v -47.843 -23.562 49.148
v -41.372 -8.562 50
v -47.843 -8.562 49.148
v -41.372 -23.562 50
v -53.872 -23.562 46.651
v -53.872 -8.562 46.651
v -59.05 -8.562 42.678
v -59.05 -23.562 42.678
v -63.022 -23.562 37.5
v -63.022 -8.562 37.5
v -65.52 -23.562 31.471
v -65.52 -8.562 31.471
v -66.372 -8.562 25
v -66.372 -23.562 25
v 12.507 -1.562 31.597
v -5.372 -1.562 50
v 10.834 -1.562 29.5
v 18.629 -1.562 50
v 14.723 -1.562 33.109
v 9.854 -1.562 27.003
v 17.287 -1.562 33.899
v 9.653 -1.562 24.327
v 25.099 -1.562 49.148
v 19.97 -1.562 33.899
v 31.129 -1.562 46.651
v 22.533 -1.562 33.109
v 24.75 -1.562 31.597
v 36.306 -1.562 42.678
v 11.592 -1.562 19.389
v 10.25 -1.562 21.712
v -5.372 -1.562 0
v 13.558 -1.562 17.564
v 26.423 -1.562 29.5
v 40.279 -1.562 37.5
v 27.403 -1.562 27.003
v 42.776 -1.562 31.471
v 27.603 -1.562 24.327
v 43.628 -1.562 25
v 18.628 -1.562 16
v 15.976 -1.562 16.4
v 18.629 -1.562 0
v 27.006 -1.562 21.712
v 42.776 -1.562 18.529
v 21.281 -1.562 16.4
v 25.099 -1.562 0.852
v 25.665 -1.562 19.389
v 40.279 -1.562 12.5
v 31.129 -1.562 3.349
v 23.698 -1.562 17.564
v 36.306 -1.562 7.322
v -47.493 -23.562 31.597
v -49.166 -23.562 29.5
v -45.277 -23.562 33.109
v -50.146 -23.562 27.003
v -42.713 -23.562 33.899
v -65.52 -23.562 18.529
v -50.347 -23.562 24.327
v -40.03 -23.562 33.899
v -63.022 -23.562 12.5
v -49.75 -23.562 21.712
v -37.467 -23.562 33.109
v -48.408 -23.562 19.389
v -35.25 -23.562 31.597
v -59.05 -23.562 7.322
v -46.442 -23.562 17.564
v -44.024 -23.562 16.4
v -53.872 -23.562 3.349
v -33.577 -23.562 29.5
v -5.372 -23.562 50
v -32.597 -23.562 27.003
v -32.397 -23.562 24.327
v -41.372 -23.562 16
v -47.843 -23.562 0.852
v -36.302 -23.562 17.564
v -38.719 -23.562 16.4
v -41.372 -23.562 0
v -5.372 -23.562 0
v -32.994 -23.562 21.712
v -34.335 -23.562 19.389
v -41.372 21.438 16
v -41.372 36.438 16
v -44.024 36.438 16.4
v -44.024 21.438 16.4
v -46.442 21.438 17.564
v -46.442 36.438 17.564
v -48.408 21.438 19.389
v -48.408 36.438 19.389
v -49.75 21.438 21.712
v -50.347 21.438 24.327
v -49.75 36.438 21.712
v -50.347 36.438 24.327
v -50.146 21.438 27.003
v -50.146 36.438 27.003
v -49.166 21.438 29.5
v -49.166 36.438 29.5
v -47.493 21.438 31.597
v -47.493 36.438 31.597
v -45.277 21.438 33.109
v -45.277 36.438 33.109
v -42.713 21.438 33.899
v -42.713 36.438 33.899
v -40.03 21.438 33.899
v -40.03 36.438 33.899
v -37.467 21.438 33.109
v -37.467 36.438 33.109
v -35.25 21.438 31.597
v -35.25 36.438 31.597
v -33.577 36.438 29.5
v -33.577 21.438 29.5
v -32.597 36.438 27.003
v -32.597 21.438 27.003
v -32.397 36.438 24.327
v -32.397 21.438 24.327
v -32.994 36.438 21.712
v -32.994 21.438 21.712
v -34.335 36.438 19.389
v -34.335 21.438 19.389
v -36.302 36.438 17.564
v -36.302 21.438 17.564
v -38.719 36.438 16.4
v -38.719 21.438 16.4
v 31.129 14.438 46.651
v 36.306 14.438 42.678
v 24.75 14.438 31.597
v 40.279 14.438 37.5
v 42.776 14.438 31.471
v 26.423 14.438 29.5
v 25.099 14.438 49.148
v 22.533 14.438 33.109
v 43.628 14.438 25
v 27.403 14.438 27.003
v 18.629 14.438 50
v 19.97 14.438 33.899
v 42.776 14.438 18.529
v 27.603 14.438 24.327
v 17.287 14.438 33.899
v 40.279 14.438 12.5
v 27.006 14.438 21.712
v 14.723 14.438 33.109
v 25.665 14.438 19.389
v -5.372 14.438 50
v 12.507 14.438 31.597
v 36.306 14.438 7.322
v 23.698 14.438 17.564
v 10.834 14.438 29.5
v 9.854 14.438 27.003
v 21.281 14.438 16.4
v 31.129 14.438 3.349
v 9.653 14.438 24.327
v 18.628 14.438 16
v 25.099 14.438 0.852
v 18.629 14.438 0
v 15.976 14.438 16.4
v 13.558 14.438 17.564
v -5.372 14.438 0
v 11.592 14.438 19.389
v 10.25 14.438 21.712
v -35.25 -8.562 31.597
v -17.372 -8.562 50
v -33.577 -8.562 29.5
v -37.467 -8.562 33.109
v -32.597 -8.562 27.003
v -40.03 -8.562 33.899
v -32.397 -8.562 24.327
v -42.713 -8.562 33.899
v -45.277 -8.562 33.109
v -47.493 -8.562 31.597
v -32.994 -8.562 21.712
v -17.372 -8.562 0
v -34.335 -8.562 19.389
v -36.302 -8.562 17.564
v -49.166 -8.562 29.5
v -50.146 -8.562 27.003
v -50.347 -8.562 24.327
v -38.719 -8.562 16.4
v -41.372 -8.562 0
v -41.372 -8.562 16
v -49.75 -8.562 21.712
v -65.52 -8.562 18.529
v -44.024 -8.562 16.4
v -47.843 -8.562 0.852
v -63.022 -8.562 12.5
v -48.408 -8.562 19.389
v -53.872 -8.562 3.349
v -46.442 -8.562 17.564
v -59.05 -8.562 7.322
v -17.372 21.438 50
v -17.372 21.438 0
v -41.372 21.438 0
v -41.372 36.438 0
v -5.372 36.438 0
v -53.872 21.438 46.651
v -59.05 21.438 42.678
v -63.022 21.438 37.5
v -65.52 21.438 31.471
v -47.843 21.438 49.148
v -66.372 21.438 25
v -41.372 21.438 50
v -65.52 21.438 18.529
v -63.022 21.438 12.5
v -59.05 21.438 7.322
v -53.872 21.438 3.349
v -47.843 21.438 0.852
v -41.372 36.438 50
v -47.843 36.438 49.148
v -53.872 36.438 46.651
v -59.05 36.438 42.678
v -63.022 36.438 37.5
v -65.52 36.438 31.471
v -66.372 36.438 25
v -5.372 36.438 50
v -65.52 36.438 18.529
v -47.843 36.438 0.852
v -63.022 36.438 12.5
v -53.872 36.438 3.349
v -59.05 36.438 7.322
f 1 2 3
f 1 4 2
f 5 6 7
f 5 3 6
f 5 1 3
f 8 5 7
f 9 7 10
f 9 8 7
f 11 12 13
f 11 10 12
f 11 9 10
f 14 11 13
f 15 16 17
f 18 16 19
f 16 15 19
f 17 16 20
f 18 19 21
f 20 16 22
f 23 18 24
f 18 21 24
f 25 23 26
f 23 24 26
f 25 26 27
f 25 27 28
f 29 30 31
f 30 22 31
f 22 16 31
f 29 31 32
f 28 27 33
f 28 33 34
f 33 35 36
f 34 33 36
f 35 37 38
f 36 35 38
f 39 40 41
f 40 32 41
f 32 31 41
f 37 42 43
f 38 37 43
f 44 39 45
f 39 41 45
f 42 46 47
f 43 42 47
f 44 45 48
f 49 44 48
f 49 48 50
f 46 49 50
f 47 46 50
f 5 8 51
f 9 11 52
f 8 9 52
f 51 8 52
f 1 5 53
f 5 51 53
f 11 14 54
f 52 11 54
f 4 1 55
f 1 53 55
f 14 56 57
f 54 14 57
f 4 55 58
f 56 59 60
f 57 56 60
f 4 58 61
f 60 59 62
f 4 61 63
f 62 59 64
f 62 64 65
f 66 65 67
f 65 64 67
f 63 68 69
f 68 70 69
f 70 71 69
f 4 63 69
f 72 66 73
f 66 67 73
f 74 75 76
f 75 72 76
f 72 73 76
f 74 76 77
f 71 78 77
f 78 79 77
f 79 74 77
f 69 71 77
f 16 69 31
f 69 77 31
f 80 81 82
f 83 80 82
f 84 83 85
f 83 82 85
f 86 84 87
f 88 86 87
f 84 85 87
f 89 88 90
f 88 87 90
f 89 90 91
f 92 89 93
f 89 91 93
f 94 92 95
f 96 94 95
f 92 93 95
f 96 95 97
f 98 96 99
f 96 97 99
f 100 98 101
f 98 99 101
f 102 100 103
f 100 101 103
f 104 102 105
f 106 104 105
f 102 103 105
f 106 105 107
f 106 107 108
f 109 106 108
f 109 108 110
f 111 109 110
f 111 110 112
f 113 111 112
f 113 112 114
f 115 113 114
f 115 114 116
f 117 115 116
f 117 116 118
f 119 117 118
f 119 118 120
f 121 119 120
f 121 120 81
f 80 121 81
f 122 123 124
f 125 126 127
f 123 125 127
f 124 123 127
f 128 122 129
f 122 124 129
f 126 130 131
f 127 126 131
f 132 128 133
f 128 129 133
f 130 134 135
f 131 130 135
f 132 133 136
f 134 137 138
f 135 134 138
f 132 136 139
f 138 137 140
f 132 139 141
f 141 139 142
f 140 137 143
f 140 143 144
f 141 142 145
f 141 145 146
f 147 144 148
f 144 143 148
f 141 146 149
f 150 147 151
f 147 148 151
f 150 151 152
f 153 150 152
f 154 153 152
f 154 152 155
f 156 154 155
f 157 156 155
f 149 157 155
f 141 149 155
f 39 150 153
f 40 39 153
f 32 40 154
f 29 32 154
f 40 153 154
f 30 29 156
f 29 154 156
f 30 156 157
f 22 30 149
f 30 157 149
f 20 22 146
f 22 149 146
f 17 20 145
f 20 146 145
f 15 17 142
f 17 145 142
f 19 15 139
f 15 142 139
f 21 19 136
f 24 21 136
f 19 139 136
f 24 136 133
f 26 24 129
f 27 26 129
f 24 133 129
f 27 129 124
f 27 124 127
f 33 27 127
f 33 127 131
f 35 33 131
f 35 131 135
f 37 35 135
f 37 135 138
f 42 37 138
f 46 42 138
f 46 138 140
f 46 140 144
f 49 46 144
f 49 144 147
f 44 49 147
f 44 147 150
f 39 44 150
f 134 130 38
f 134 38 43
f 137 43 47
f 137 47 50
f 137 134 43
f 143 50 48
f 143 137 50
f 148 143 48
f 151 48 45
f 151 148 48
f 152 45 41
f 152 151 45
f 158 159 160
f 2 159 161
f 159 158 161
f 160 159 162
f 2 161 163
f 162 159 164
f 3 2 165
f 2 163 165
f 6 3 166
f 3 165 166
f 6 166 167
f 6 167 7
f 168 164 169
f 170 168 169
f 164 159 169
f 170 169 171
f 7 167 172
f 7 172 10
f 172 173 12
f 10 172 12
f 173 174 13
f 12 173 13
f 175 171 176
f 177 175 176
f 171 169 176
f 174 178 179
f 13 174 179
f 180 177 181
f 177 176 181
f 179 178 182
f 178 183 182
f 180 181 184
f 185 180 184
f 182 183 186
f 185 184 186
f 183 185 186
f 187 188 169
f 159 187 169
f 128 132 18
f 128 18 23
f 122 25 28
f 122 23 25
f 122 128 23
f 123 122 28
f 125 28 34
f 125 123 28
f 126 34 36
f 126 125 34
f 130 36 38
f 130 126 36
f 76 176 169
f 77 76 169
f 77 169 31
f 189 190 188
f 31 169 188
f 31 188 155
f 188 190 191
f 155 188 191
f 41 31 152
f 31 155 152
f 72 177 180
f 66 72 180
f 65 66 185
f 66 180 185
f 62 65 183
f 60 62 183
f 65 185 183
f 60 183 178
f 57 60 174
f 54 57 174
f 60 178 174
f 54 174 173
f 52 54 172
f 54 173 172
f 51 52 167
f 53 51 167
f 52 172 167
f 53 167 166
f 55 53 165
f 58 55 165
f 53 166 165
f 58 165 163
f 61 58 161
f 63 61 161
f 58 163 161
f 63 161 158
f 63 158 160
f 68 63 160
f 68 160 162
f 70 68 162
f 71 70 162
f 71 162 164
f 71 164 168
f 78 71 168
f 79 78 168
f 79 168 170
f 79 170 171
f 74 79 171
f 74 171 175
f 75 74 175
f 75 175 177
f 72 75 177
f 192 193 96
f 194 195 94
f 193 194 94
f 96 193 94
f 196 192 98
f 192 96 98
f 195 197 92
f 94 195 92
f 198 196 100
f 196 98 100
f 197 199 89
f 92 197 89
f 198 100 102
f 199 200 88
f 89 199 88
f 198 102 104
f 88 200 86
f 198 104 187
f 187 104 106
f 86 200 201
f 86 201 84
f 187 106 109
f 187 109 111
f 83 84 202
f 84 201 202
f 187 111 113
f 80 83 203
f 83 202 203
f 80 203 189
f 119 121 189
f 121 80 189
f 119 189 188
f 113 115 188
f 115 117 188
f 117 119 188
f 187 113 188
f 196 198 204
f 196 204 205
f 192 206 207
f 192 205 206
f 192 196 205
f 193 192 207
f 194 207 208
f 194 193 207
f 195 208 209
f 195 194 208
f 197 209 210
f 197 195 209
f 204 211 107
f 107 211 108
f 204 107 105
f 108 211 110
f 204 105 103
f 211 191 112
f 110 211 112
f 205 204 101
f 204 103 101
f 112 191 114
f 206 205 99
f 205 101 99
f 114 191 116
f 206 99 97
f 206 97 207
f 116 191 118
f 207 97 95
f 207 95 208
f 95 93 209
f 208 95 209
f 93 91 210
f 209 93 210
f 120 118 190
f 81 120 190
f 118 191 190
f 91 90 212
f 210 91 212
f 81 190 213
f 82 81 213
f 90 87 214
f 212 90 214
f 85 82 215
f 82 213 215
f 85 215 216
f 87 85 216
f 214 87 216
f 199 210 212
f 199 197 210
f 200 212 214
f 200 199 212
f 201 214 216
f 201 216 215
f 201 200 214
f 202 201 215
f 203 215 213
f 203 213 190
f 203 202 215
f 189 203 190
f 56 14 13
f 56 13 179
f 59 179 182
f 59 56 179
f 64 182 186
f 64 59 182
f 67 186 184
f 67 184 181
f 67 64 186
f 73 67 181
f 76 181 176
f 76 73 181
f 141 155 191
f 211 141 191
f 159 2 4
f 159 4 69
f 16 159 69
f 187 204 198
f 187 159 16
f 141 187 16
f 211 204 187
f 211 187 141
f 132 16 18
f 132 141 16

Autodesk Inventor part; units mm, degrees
ref_plane "YZ Plane" through (0, 0, 0) normal (1, 0, 0) x (0, 1, 0)
ref_plane "XZ Plane" through (0, 0, 0) normal (0, 1, 0) x (-1, 0, 0)
ref_plane "XY Plane" through (0, 0, 0) normal (0, 0, 1) x (1, 0, 0)
sketch "Sketch1" plane through (0, 0, 0) normal (0, 0, 1) x (1, 0, 0)
  line L0 (-66.3717, -23.5619) -> (-5.3717, -23.5619)
  line L1 (-5.3717, -23.5619) -> (-5.3717, -1.5619)
  line L2 (-5.3717, -1.5619) -> (43.6283, -1.5619)
  line L3 (43.6283, -1.5619) -> (43.6283, 14.4381)
  line L4 (43.6283, 14.4381) -> (-5.3717, 14.4381)
  line L5 (-5.3717, 14.4381) -> (-5.3717, 36.4381)
  line L6 (-5.3717, 36.4381) -> (-66.3717, 36.4381)
  line L7 (-66.3717, 36.4381) -> (-66.3717, 21.4381)
  line L8 (-66.3717, 21.4381) -> (-17.3717, 21.4381)
  line L9 (-17.3717, 21.4381) -> (-17.3717, -8.5619)
  line L10 (-17.3717, -8.5619) -> (-66.3717, -8.5619)
  line L11 (-66.3717, -8.5619) -> (-66.3717, -23.5619)
  point P0 (0, 0)
  dimension "d0" = 15
  dimension "d1" = 15
  dimension "d2" = 60
  dimension "d3" = 12
  dimension "d4" = 61
  dimension "d5" = 22
  dimension "d6" = 22
  dimension "d7" = 49
  dimension "d8" = 43.6283
  dimension "d9" = 1.5619
extrude "Extrusion1" add sketch "Sketch1" along normal blind 50
fillet "Fillet1" radius 25 6 edges at (43.6283, 6.4381, 50) (43.6283, 6.4381, 0) (-66.3717, 28.9381, 50) (-66.3717, -16.0619, 50) (-66.3717, 28.9381, 0) (-66.3717, -16.0619, 0)
sketch "Sketch2" plane through (-5.3717, -23.5619, 0) normal (0, -1, 0) x (1, 0, 0)
  arc A0 (-36, 50) -> (-36, 0) centre (-36, 25) ccw projected
  arc A1 (24, 0) -> (24, 50) centre (24, 25) ccw projected
  point P0 (5.3717, 0)
hole "Hole1" at (-41.3717, -23.5619, 25) at (18.6283, -23.5619, 25) direction (0, 1, 0) diameter 18 end through all
properties part number "6_16_V"
